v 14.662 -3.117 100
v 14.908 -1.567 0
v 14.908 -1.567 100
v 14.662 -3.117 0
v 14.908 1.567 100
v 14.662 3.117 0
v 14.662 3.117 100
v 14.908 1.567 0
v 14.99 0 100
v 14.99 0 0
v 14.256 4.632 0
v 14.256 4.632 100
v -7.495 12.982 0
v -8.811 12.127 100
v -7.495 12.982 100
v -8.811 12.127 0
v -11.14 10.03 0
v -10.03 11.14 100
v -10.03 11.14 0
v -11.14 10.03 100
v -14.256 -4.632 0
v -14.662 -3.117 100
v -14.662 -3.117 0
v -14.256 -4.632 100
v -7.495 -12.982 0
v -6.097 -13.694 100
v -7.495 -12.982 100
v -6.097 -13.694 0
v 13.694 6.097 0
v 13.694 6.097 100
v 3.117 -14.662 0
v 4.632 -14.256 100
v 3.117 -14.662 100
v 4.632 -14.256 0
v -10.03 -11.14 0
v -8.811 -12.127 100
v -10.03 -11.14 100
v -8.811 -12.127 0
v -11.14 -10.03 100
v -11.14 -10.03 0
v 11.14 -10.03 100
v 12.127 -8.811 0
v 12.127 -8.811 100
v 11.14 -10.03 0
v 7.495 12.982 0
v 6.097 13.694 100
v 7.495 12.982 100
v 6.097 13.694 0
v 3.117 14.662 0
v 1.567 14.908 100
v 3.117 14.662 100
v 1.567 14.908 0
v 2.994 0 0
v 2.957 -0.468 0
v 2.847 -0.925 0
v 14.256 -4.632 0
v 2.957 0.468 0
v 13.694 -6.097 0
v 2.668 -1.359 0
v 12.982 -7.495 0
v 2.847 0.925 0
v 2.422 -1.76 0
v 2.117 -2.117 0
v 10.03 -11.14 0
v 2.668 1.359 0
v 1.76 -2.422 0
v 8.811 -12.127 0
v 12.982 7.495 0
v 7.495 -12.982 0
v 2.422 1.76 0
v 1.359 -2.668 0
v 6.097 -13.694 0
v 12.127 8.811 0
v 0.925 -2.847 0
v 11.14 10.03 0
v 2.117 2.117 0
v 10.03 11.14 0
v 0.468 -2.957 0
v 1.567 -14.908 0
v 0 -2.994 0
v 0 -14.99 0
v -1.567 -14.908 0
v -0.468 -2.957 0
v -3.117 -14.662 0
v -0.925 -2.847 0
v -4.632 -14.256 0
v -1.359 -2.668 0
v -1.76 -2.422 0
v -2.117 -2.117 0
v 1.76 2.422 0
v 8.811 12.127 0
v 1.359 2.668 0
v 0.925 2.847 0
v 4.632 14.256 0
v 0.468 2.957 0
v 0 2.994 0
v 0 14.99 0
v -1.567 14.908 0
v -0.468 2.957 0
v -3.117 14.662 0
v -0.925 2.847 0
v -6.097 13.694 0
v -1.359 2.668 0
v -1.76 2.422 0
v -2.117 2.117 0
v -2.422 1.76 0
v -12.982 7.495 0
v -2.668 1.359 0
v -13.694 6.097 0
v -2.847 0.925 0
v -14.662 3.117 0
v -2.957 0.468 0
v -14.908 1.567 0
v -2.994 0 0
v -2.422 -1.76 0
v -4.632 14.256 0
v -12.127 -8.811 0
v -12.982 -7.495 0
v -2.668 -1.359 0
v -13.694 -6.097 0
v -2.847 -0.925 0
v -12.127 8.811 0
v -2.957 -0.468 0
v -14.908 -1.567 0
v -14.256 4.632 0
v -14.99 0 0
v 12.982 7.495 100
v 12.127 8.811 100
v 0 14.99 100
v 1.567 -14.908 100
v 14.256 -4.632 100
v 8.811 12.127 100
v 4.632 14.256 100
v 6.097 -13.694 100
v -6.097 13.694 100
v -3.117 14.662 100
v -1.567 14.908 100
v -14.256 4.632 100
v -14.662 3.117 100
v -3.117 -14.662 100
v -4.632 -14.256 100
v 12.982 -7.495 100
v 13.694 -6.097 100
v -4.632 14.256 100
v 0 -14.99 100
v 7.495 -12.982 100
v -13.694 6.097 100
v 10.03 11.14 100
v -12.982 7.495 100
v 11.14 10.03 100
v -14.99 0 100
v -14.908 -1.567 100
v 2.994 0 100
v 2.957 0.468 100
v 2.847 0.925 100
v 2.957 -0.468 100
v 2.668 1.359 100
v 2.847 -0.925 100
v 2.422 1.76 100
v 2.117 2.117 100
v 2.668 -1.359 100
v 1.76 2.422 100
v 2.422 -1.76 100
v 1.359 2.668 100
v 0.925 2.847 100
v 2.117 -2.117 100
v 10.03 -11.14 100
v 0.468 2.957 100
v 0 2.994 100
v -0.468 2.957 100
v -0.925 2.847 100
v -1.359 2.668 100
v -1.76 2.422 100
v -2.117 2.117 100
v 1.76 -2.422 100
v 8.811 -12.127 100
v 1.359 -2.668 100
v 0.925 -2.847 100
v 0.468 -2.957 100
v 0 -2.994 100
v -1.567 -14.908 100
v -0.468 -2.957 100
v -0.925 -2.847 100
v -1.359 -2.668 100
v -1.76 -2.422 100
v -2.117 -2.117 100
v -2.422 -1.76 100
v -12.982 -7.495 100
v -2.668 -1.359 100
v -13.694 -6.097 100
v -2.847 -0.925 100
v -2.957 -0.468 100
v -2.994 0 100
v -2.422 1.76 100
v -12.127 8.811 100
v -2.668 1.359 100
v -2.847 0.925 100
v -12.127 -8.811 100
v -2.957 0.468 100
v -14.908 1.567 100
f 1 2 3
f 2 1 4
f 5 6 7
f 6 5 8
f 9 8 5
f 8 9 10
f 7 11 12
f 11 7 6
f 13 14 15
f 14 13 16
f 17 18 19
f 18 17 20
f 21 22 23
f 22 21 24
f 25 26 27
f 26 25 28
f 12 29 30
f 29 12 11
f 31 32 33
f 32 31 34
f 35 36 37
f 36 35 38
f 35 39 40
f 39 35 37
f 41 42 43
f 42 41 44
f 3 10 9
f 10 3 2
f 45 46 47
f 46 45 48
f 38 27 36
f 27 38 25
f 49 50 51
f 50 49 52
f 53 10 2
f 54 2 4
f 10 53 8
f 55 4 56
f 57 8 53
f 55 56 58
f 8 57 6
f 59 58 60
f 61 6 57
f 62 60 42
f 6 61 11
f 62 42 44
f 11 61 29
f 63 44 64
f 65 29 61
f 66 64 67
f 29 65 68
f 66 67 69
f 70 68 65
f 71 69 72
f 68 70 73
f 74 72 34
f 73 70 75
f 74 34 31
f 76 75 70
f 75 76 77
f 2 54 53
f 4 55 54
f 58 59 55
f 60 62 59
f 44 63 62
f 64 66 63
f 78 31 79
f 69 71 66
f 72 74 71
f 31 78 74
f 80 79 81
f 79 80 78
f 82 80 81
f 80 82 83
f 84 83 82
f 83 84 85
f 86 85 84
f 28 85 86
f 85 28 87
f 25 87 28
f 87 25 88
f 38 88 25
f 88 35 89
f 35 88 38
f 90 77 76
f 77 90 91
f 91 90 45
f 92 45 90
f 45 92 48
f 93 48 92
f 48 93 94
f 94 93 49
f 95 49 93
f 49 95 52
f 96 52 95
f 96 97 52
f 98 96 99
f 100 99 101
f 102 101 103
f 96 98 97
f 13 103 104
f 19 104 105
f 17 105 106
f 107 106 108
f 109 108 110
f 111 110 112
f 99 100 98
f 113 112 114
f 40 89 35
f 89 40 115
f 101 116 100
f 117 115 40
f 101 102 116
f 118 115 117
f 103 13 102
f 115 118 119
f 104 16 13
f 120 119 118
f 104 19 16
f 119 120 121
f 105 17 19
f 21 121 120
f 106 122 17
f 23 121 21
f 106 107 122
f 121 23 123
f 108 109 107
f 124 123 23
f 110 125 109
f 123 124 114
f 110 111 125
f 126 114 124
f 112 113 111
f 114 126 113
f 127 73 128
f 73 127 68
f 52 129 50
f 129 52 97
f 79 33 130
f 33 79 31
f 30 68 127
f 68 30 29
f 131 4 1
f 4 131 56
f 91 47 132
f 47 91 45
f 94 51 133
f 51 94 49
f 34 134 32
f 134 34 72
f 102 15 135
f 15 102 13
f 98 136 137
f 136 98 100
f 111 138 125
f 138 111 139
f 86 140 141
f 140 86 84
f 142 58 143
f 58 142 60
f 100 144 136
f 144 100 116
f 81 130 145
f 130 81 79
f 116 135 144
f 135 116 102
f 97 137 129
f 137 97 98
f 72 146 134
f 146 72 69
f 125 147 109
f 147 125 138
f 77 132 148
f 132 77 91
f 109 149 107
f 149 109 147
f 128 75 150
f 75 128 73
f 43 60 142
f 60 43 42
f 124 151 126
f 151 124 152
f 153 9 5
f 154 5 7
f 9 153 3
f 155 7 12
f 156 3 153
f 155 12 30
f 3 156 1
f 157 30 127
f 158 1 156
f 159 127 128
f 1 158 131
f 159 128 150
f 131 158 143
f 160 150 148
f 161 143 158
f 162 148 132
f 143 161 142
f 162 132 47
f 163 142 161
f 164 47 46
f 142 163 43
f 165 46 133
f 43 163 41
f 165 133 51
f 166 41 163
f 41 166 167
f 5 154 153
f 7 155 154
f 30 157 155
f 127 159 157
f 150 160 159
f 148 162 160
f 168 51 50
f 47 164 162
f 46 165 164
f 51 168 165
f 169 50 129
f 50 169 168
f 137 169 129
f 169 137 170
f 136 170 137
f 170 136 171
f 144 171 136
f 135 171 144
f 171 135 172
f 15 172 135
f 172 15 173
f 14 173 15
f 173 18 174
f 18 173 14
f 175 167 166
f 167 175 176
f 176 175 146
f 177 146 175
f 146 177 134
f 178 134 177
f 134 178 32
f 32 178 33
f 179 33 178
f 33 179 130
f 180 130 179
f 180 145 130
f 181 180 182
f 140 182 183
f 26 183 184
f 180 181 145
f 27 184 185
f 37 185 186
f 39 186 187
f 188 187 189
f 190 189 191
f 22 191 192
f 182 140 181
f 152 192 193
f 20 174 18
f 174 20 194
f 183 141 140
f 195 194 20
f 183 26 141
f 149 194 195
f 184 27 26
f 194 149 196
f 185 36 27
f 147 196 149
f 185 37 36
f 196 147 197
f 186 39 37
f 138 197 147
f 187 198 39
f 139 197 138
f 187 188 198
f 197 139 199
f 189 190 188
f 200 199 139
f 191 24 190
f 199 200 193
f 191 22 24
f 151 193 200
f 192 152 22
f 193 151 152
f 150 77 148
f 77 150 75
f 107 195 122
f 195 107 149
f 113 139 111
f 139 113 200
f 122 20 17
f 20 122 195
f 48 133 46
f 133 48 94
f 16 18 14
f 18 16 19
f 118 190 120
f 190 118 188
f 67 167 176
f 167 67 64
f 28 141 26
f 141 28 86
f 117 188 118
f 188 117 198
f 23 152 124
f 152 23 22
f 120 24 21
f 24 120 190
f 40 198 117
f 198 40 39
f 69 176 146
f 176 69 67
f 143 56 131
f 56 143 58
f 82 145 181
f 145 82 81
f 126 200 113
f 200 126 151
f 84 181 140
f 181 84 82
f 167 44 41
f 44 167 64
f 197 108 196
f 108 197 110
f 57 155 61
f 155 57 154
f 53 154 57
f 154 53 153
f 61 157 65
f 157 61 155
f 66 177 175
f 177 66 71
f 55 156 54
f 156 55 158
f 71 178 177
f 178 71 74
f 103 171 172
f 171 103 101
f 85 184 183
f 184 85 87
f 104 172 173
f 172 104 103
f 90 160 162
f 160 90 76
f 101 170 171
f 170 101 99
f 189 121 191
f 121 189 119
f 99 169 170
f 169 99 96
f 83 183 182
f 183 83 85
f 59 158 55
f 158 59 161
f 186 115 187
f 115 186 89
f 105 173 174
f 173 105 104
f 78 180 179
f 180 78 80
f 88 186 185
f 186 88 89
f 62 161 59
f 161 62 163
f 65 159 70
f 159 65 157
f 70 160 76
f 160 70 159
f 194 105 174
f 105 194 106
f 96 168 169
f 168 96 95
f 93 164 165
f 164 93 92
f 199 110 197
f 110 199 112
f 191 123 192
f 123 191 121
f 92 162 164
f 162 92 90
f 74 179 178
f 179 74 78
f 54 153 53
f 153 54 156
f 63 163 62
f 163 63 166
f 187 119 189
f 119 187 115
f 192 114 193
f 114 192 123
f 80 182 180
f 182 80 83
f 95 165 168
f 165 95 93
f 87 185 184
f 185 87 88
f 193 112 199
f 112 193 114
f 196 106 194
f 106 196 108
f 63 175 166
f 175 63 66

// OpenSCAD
        wall_thickness = 2.62;
        bore_clearance = 0.994;
        roller_radius = 14.99;

        module roller() {
            difference() {
                cylinder(h=100, r=roller_radius, $fn=60);
                translate([0,0,-5])
                    cylinder(h=110, r=bore_clearance + 2, $fn=40);
            }
        }
        roller();
        
